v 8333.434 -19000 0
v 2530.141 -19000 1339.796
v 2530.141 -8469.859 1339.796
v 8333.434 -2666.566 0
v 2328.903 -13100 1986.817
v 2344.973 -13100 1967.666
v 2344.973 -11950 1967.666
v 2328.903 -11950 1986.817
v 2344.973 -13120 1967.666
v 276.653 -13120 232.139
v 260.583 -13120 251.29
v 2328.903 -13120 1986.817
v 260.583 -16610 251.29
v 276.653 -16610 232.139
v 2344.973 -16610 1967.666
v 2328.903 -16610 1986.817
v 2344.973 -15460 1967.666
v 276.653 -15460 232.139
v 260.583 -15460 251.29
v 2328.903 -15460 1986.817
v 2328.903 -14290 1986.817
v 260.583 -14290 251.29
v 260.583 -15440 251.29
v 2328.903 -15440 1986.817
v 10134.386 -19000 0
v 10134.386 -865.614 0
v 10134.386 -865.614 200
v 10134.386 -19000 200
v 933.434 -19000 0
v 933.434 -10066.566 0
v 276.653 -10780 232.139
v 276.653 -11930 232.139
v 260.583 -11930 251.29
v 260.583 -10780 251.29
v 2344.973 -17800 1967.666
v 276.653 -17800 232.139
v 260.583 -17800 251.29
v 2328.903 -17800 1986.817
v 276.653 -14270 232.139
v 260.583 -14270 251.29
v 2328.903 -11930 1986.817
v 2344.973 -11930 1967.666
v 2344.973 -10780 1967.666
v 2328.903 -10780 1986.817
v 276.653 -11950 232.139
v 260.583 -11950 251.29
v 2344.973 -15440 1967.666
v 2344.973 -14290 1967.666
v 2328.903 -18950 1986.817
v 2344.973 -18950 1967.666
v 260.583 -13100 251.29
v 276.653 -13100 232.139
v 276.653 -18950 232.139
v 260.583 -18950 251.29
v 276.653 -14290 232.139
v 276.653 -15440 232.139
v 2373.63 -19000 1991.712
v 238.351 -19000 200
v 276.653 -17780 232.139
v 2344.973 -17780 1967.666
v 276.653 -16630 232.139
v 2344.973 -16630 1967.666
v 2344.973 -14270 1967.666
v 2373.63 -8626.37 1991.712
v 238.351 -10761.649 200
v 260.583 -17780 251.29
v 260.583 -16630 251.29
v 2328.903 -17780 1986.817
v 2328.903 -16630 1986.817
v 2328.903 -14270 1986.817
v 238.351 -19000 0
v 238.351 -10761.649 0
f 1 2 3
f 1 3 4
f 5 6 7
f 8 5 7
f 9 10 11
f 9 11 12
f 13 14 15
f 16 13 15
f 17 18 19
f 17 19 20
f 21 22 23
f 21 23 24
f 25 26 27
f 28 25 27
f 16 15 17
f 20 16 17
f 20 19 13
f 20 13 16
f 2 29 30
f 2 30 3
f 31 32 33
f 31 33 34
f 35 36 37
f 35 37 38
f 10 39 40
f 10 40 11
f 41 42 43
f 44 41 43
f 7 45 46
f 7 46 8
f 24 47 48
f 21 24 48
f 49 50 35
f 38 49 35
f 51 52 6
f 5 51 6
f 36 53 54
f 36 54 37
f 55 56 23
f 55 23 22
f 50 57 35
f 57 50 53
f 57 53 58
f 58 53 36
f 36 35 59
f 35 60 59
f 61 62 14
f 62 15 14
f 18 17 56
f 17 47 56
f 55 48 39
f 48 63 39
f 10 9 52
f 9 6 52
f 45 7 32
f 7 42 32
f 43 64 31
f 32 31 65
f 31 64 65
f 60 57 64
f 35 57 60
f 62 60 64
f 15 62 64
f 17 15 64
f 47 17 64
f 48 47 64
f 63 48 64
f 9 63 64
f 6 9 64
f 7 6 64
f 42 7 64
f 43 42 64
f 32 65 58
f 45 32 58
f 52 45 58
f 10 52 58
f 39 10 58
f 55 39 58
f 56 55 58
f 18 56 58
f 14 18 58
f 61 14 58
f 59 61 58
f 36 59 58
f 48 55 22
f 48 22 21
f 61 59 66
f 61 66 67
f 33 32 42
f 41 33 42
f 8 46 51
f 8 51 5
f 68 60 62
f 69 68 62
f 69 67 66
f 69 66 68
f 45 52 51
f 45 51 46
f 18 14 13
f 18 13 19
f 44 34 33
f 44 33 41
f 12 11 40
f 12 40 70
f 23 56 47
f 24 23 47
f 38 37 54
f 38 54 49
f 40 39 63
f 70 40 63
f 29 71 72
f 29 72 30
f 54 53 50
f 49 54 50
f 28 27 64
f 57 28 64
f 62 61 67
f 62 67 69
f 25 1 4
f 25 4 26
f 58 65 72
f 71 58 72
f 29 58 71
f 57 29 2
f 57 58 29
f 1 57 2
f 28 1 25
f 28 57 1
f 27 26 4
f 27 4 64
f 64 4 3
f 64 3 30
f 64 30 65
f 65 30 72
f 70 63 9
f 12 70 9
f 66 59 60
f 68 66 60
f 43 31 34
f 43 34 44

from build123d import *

# Parameters (mm, degrees)
F1_DEPTH = 19000
F3_DEPTH = 1991.7127787042
F4_W     = 2700
F4_H     = 1150
F5_DEPTH = 25


# Not quite as in the source:
# - a feature names something its author has since deleted; it is built from what else it names


with BuildPart() as f1:
    # F0 (on Front) → F1 (new body)
    with BuildSketch(Plane.XZ):
        Polygon((2373.6296676829, 1991.7117787042), (238.3507185188, 200), (238.3507185188, 0), (933.4342961162, 0), (2530.1408313205, 1339.7958647882), (8333.4342961162, 0), (10134.3860108109, 0), (10134.3860108109, 200), align=None)
    extrude(amount=F1_DEPTH)

    # F2 (on face) → F3 (cut, through all)
    with BuildSketch(Plane(origin=(0, 0, 0), x_dir=(1, 0, 0), z_dir=(0, 0, -1))):
        Polygon((238.3507185188, 238.3507185188), (0, 0), (238.3507185188, 0), align=None)
        Polygon((238.3507185188, 11000), (0, 11000), (238.3507185188, 10761.6492814812), align=None)
        Polygon((0, 11000), (0, 0), (238.3507185188, 238.3507185188), (238.3507185188, 10761.6492814812), align=None)
        Polygon((5500, 5500), (933.4342961162, 933.4342961162), (933.4342961162, 0), (11000, 0), align=None)
        Polygon((933.4342961162, 933.4342961162), (238.3507185188, 238.3507185188), (238.3507185188, 0), (933.4342961162, 0), align=None)
        Polygon((238.3507185188, 10761.6492814812), (238.3507185188, 238.3507185188), (933.4342961162, 933.4342961162), (933.4342961162, 10066.5657038838), align=None)
        Polygon((933.4342961162, 10066.5657038838), (933.4342961162, 933.4342961162), (5500, 5500), align=None)
    extrude(amount=-F3_DEPTH, mode=Mode.SUBTRACT)

    # F4 (on face) → F5 (join)
    with BuildSketch(Plane(origin=(0, 0, 0), x_dir=(0.7660444431, 0, 0.6427876097), z_dir=(-0.6427876097, 0, 0.7660444431))):
        with Locations((1711.1447653721, -18375)):
            Rectangle(F4_W, F4_H)
        with Locations((1711.1447653721, -17205)):
            Rectangle(F4_W, F4_H)
        with Locations((1711.1447653721, -16035)):
            Rectangle(F4_W, F4_H)
        with Locations((1711.1447653721, -14865)):
            Rectangle(F4_W, F4_H)
        with Locations((1711.1447653721, -13695)):
            Rectangle(F4_W, F4_H)
        with Locations((1711.1447653721, -12525)):
            Rectangle(F4_W, F4_H)
        with Locations((1711.1447653721, -11355)):
            Rectangle(F4_W, F4_H)
    extrude(amount=F5_DEPTH)


solid = f1.part
